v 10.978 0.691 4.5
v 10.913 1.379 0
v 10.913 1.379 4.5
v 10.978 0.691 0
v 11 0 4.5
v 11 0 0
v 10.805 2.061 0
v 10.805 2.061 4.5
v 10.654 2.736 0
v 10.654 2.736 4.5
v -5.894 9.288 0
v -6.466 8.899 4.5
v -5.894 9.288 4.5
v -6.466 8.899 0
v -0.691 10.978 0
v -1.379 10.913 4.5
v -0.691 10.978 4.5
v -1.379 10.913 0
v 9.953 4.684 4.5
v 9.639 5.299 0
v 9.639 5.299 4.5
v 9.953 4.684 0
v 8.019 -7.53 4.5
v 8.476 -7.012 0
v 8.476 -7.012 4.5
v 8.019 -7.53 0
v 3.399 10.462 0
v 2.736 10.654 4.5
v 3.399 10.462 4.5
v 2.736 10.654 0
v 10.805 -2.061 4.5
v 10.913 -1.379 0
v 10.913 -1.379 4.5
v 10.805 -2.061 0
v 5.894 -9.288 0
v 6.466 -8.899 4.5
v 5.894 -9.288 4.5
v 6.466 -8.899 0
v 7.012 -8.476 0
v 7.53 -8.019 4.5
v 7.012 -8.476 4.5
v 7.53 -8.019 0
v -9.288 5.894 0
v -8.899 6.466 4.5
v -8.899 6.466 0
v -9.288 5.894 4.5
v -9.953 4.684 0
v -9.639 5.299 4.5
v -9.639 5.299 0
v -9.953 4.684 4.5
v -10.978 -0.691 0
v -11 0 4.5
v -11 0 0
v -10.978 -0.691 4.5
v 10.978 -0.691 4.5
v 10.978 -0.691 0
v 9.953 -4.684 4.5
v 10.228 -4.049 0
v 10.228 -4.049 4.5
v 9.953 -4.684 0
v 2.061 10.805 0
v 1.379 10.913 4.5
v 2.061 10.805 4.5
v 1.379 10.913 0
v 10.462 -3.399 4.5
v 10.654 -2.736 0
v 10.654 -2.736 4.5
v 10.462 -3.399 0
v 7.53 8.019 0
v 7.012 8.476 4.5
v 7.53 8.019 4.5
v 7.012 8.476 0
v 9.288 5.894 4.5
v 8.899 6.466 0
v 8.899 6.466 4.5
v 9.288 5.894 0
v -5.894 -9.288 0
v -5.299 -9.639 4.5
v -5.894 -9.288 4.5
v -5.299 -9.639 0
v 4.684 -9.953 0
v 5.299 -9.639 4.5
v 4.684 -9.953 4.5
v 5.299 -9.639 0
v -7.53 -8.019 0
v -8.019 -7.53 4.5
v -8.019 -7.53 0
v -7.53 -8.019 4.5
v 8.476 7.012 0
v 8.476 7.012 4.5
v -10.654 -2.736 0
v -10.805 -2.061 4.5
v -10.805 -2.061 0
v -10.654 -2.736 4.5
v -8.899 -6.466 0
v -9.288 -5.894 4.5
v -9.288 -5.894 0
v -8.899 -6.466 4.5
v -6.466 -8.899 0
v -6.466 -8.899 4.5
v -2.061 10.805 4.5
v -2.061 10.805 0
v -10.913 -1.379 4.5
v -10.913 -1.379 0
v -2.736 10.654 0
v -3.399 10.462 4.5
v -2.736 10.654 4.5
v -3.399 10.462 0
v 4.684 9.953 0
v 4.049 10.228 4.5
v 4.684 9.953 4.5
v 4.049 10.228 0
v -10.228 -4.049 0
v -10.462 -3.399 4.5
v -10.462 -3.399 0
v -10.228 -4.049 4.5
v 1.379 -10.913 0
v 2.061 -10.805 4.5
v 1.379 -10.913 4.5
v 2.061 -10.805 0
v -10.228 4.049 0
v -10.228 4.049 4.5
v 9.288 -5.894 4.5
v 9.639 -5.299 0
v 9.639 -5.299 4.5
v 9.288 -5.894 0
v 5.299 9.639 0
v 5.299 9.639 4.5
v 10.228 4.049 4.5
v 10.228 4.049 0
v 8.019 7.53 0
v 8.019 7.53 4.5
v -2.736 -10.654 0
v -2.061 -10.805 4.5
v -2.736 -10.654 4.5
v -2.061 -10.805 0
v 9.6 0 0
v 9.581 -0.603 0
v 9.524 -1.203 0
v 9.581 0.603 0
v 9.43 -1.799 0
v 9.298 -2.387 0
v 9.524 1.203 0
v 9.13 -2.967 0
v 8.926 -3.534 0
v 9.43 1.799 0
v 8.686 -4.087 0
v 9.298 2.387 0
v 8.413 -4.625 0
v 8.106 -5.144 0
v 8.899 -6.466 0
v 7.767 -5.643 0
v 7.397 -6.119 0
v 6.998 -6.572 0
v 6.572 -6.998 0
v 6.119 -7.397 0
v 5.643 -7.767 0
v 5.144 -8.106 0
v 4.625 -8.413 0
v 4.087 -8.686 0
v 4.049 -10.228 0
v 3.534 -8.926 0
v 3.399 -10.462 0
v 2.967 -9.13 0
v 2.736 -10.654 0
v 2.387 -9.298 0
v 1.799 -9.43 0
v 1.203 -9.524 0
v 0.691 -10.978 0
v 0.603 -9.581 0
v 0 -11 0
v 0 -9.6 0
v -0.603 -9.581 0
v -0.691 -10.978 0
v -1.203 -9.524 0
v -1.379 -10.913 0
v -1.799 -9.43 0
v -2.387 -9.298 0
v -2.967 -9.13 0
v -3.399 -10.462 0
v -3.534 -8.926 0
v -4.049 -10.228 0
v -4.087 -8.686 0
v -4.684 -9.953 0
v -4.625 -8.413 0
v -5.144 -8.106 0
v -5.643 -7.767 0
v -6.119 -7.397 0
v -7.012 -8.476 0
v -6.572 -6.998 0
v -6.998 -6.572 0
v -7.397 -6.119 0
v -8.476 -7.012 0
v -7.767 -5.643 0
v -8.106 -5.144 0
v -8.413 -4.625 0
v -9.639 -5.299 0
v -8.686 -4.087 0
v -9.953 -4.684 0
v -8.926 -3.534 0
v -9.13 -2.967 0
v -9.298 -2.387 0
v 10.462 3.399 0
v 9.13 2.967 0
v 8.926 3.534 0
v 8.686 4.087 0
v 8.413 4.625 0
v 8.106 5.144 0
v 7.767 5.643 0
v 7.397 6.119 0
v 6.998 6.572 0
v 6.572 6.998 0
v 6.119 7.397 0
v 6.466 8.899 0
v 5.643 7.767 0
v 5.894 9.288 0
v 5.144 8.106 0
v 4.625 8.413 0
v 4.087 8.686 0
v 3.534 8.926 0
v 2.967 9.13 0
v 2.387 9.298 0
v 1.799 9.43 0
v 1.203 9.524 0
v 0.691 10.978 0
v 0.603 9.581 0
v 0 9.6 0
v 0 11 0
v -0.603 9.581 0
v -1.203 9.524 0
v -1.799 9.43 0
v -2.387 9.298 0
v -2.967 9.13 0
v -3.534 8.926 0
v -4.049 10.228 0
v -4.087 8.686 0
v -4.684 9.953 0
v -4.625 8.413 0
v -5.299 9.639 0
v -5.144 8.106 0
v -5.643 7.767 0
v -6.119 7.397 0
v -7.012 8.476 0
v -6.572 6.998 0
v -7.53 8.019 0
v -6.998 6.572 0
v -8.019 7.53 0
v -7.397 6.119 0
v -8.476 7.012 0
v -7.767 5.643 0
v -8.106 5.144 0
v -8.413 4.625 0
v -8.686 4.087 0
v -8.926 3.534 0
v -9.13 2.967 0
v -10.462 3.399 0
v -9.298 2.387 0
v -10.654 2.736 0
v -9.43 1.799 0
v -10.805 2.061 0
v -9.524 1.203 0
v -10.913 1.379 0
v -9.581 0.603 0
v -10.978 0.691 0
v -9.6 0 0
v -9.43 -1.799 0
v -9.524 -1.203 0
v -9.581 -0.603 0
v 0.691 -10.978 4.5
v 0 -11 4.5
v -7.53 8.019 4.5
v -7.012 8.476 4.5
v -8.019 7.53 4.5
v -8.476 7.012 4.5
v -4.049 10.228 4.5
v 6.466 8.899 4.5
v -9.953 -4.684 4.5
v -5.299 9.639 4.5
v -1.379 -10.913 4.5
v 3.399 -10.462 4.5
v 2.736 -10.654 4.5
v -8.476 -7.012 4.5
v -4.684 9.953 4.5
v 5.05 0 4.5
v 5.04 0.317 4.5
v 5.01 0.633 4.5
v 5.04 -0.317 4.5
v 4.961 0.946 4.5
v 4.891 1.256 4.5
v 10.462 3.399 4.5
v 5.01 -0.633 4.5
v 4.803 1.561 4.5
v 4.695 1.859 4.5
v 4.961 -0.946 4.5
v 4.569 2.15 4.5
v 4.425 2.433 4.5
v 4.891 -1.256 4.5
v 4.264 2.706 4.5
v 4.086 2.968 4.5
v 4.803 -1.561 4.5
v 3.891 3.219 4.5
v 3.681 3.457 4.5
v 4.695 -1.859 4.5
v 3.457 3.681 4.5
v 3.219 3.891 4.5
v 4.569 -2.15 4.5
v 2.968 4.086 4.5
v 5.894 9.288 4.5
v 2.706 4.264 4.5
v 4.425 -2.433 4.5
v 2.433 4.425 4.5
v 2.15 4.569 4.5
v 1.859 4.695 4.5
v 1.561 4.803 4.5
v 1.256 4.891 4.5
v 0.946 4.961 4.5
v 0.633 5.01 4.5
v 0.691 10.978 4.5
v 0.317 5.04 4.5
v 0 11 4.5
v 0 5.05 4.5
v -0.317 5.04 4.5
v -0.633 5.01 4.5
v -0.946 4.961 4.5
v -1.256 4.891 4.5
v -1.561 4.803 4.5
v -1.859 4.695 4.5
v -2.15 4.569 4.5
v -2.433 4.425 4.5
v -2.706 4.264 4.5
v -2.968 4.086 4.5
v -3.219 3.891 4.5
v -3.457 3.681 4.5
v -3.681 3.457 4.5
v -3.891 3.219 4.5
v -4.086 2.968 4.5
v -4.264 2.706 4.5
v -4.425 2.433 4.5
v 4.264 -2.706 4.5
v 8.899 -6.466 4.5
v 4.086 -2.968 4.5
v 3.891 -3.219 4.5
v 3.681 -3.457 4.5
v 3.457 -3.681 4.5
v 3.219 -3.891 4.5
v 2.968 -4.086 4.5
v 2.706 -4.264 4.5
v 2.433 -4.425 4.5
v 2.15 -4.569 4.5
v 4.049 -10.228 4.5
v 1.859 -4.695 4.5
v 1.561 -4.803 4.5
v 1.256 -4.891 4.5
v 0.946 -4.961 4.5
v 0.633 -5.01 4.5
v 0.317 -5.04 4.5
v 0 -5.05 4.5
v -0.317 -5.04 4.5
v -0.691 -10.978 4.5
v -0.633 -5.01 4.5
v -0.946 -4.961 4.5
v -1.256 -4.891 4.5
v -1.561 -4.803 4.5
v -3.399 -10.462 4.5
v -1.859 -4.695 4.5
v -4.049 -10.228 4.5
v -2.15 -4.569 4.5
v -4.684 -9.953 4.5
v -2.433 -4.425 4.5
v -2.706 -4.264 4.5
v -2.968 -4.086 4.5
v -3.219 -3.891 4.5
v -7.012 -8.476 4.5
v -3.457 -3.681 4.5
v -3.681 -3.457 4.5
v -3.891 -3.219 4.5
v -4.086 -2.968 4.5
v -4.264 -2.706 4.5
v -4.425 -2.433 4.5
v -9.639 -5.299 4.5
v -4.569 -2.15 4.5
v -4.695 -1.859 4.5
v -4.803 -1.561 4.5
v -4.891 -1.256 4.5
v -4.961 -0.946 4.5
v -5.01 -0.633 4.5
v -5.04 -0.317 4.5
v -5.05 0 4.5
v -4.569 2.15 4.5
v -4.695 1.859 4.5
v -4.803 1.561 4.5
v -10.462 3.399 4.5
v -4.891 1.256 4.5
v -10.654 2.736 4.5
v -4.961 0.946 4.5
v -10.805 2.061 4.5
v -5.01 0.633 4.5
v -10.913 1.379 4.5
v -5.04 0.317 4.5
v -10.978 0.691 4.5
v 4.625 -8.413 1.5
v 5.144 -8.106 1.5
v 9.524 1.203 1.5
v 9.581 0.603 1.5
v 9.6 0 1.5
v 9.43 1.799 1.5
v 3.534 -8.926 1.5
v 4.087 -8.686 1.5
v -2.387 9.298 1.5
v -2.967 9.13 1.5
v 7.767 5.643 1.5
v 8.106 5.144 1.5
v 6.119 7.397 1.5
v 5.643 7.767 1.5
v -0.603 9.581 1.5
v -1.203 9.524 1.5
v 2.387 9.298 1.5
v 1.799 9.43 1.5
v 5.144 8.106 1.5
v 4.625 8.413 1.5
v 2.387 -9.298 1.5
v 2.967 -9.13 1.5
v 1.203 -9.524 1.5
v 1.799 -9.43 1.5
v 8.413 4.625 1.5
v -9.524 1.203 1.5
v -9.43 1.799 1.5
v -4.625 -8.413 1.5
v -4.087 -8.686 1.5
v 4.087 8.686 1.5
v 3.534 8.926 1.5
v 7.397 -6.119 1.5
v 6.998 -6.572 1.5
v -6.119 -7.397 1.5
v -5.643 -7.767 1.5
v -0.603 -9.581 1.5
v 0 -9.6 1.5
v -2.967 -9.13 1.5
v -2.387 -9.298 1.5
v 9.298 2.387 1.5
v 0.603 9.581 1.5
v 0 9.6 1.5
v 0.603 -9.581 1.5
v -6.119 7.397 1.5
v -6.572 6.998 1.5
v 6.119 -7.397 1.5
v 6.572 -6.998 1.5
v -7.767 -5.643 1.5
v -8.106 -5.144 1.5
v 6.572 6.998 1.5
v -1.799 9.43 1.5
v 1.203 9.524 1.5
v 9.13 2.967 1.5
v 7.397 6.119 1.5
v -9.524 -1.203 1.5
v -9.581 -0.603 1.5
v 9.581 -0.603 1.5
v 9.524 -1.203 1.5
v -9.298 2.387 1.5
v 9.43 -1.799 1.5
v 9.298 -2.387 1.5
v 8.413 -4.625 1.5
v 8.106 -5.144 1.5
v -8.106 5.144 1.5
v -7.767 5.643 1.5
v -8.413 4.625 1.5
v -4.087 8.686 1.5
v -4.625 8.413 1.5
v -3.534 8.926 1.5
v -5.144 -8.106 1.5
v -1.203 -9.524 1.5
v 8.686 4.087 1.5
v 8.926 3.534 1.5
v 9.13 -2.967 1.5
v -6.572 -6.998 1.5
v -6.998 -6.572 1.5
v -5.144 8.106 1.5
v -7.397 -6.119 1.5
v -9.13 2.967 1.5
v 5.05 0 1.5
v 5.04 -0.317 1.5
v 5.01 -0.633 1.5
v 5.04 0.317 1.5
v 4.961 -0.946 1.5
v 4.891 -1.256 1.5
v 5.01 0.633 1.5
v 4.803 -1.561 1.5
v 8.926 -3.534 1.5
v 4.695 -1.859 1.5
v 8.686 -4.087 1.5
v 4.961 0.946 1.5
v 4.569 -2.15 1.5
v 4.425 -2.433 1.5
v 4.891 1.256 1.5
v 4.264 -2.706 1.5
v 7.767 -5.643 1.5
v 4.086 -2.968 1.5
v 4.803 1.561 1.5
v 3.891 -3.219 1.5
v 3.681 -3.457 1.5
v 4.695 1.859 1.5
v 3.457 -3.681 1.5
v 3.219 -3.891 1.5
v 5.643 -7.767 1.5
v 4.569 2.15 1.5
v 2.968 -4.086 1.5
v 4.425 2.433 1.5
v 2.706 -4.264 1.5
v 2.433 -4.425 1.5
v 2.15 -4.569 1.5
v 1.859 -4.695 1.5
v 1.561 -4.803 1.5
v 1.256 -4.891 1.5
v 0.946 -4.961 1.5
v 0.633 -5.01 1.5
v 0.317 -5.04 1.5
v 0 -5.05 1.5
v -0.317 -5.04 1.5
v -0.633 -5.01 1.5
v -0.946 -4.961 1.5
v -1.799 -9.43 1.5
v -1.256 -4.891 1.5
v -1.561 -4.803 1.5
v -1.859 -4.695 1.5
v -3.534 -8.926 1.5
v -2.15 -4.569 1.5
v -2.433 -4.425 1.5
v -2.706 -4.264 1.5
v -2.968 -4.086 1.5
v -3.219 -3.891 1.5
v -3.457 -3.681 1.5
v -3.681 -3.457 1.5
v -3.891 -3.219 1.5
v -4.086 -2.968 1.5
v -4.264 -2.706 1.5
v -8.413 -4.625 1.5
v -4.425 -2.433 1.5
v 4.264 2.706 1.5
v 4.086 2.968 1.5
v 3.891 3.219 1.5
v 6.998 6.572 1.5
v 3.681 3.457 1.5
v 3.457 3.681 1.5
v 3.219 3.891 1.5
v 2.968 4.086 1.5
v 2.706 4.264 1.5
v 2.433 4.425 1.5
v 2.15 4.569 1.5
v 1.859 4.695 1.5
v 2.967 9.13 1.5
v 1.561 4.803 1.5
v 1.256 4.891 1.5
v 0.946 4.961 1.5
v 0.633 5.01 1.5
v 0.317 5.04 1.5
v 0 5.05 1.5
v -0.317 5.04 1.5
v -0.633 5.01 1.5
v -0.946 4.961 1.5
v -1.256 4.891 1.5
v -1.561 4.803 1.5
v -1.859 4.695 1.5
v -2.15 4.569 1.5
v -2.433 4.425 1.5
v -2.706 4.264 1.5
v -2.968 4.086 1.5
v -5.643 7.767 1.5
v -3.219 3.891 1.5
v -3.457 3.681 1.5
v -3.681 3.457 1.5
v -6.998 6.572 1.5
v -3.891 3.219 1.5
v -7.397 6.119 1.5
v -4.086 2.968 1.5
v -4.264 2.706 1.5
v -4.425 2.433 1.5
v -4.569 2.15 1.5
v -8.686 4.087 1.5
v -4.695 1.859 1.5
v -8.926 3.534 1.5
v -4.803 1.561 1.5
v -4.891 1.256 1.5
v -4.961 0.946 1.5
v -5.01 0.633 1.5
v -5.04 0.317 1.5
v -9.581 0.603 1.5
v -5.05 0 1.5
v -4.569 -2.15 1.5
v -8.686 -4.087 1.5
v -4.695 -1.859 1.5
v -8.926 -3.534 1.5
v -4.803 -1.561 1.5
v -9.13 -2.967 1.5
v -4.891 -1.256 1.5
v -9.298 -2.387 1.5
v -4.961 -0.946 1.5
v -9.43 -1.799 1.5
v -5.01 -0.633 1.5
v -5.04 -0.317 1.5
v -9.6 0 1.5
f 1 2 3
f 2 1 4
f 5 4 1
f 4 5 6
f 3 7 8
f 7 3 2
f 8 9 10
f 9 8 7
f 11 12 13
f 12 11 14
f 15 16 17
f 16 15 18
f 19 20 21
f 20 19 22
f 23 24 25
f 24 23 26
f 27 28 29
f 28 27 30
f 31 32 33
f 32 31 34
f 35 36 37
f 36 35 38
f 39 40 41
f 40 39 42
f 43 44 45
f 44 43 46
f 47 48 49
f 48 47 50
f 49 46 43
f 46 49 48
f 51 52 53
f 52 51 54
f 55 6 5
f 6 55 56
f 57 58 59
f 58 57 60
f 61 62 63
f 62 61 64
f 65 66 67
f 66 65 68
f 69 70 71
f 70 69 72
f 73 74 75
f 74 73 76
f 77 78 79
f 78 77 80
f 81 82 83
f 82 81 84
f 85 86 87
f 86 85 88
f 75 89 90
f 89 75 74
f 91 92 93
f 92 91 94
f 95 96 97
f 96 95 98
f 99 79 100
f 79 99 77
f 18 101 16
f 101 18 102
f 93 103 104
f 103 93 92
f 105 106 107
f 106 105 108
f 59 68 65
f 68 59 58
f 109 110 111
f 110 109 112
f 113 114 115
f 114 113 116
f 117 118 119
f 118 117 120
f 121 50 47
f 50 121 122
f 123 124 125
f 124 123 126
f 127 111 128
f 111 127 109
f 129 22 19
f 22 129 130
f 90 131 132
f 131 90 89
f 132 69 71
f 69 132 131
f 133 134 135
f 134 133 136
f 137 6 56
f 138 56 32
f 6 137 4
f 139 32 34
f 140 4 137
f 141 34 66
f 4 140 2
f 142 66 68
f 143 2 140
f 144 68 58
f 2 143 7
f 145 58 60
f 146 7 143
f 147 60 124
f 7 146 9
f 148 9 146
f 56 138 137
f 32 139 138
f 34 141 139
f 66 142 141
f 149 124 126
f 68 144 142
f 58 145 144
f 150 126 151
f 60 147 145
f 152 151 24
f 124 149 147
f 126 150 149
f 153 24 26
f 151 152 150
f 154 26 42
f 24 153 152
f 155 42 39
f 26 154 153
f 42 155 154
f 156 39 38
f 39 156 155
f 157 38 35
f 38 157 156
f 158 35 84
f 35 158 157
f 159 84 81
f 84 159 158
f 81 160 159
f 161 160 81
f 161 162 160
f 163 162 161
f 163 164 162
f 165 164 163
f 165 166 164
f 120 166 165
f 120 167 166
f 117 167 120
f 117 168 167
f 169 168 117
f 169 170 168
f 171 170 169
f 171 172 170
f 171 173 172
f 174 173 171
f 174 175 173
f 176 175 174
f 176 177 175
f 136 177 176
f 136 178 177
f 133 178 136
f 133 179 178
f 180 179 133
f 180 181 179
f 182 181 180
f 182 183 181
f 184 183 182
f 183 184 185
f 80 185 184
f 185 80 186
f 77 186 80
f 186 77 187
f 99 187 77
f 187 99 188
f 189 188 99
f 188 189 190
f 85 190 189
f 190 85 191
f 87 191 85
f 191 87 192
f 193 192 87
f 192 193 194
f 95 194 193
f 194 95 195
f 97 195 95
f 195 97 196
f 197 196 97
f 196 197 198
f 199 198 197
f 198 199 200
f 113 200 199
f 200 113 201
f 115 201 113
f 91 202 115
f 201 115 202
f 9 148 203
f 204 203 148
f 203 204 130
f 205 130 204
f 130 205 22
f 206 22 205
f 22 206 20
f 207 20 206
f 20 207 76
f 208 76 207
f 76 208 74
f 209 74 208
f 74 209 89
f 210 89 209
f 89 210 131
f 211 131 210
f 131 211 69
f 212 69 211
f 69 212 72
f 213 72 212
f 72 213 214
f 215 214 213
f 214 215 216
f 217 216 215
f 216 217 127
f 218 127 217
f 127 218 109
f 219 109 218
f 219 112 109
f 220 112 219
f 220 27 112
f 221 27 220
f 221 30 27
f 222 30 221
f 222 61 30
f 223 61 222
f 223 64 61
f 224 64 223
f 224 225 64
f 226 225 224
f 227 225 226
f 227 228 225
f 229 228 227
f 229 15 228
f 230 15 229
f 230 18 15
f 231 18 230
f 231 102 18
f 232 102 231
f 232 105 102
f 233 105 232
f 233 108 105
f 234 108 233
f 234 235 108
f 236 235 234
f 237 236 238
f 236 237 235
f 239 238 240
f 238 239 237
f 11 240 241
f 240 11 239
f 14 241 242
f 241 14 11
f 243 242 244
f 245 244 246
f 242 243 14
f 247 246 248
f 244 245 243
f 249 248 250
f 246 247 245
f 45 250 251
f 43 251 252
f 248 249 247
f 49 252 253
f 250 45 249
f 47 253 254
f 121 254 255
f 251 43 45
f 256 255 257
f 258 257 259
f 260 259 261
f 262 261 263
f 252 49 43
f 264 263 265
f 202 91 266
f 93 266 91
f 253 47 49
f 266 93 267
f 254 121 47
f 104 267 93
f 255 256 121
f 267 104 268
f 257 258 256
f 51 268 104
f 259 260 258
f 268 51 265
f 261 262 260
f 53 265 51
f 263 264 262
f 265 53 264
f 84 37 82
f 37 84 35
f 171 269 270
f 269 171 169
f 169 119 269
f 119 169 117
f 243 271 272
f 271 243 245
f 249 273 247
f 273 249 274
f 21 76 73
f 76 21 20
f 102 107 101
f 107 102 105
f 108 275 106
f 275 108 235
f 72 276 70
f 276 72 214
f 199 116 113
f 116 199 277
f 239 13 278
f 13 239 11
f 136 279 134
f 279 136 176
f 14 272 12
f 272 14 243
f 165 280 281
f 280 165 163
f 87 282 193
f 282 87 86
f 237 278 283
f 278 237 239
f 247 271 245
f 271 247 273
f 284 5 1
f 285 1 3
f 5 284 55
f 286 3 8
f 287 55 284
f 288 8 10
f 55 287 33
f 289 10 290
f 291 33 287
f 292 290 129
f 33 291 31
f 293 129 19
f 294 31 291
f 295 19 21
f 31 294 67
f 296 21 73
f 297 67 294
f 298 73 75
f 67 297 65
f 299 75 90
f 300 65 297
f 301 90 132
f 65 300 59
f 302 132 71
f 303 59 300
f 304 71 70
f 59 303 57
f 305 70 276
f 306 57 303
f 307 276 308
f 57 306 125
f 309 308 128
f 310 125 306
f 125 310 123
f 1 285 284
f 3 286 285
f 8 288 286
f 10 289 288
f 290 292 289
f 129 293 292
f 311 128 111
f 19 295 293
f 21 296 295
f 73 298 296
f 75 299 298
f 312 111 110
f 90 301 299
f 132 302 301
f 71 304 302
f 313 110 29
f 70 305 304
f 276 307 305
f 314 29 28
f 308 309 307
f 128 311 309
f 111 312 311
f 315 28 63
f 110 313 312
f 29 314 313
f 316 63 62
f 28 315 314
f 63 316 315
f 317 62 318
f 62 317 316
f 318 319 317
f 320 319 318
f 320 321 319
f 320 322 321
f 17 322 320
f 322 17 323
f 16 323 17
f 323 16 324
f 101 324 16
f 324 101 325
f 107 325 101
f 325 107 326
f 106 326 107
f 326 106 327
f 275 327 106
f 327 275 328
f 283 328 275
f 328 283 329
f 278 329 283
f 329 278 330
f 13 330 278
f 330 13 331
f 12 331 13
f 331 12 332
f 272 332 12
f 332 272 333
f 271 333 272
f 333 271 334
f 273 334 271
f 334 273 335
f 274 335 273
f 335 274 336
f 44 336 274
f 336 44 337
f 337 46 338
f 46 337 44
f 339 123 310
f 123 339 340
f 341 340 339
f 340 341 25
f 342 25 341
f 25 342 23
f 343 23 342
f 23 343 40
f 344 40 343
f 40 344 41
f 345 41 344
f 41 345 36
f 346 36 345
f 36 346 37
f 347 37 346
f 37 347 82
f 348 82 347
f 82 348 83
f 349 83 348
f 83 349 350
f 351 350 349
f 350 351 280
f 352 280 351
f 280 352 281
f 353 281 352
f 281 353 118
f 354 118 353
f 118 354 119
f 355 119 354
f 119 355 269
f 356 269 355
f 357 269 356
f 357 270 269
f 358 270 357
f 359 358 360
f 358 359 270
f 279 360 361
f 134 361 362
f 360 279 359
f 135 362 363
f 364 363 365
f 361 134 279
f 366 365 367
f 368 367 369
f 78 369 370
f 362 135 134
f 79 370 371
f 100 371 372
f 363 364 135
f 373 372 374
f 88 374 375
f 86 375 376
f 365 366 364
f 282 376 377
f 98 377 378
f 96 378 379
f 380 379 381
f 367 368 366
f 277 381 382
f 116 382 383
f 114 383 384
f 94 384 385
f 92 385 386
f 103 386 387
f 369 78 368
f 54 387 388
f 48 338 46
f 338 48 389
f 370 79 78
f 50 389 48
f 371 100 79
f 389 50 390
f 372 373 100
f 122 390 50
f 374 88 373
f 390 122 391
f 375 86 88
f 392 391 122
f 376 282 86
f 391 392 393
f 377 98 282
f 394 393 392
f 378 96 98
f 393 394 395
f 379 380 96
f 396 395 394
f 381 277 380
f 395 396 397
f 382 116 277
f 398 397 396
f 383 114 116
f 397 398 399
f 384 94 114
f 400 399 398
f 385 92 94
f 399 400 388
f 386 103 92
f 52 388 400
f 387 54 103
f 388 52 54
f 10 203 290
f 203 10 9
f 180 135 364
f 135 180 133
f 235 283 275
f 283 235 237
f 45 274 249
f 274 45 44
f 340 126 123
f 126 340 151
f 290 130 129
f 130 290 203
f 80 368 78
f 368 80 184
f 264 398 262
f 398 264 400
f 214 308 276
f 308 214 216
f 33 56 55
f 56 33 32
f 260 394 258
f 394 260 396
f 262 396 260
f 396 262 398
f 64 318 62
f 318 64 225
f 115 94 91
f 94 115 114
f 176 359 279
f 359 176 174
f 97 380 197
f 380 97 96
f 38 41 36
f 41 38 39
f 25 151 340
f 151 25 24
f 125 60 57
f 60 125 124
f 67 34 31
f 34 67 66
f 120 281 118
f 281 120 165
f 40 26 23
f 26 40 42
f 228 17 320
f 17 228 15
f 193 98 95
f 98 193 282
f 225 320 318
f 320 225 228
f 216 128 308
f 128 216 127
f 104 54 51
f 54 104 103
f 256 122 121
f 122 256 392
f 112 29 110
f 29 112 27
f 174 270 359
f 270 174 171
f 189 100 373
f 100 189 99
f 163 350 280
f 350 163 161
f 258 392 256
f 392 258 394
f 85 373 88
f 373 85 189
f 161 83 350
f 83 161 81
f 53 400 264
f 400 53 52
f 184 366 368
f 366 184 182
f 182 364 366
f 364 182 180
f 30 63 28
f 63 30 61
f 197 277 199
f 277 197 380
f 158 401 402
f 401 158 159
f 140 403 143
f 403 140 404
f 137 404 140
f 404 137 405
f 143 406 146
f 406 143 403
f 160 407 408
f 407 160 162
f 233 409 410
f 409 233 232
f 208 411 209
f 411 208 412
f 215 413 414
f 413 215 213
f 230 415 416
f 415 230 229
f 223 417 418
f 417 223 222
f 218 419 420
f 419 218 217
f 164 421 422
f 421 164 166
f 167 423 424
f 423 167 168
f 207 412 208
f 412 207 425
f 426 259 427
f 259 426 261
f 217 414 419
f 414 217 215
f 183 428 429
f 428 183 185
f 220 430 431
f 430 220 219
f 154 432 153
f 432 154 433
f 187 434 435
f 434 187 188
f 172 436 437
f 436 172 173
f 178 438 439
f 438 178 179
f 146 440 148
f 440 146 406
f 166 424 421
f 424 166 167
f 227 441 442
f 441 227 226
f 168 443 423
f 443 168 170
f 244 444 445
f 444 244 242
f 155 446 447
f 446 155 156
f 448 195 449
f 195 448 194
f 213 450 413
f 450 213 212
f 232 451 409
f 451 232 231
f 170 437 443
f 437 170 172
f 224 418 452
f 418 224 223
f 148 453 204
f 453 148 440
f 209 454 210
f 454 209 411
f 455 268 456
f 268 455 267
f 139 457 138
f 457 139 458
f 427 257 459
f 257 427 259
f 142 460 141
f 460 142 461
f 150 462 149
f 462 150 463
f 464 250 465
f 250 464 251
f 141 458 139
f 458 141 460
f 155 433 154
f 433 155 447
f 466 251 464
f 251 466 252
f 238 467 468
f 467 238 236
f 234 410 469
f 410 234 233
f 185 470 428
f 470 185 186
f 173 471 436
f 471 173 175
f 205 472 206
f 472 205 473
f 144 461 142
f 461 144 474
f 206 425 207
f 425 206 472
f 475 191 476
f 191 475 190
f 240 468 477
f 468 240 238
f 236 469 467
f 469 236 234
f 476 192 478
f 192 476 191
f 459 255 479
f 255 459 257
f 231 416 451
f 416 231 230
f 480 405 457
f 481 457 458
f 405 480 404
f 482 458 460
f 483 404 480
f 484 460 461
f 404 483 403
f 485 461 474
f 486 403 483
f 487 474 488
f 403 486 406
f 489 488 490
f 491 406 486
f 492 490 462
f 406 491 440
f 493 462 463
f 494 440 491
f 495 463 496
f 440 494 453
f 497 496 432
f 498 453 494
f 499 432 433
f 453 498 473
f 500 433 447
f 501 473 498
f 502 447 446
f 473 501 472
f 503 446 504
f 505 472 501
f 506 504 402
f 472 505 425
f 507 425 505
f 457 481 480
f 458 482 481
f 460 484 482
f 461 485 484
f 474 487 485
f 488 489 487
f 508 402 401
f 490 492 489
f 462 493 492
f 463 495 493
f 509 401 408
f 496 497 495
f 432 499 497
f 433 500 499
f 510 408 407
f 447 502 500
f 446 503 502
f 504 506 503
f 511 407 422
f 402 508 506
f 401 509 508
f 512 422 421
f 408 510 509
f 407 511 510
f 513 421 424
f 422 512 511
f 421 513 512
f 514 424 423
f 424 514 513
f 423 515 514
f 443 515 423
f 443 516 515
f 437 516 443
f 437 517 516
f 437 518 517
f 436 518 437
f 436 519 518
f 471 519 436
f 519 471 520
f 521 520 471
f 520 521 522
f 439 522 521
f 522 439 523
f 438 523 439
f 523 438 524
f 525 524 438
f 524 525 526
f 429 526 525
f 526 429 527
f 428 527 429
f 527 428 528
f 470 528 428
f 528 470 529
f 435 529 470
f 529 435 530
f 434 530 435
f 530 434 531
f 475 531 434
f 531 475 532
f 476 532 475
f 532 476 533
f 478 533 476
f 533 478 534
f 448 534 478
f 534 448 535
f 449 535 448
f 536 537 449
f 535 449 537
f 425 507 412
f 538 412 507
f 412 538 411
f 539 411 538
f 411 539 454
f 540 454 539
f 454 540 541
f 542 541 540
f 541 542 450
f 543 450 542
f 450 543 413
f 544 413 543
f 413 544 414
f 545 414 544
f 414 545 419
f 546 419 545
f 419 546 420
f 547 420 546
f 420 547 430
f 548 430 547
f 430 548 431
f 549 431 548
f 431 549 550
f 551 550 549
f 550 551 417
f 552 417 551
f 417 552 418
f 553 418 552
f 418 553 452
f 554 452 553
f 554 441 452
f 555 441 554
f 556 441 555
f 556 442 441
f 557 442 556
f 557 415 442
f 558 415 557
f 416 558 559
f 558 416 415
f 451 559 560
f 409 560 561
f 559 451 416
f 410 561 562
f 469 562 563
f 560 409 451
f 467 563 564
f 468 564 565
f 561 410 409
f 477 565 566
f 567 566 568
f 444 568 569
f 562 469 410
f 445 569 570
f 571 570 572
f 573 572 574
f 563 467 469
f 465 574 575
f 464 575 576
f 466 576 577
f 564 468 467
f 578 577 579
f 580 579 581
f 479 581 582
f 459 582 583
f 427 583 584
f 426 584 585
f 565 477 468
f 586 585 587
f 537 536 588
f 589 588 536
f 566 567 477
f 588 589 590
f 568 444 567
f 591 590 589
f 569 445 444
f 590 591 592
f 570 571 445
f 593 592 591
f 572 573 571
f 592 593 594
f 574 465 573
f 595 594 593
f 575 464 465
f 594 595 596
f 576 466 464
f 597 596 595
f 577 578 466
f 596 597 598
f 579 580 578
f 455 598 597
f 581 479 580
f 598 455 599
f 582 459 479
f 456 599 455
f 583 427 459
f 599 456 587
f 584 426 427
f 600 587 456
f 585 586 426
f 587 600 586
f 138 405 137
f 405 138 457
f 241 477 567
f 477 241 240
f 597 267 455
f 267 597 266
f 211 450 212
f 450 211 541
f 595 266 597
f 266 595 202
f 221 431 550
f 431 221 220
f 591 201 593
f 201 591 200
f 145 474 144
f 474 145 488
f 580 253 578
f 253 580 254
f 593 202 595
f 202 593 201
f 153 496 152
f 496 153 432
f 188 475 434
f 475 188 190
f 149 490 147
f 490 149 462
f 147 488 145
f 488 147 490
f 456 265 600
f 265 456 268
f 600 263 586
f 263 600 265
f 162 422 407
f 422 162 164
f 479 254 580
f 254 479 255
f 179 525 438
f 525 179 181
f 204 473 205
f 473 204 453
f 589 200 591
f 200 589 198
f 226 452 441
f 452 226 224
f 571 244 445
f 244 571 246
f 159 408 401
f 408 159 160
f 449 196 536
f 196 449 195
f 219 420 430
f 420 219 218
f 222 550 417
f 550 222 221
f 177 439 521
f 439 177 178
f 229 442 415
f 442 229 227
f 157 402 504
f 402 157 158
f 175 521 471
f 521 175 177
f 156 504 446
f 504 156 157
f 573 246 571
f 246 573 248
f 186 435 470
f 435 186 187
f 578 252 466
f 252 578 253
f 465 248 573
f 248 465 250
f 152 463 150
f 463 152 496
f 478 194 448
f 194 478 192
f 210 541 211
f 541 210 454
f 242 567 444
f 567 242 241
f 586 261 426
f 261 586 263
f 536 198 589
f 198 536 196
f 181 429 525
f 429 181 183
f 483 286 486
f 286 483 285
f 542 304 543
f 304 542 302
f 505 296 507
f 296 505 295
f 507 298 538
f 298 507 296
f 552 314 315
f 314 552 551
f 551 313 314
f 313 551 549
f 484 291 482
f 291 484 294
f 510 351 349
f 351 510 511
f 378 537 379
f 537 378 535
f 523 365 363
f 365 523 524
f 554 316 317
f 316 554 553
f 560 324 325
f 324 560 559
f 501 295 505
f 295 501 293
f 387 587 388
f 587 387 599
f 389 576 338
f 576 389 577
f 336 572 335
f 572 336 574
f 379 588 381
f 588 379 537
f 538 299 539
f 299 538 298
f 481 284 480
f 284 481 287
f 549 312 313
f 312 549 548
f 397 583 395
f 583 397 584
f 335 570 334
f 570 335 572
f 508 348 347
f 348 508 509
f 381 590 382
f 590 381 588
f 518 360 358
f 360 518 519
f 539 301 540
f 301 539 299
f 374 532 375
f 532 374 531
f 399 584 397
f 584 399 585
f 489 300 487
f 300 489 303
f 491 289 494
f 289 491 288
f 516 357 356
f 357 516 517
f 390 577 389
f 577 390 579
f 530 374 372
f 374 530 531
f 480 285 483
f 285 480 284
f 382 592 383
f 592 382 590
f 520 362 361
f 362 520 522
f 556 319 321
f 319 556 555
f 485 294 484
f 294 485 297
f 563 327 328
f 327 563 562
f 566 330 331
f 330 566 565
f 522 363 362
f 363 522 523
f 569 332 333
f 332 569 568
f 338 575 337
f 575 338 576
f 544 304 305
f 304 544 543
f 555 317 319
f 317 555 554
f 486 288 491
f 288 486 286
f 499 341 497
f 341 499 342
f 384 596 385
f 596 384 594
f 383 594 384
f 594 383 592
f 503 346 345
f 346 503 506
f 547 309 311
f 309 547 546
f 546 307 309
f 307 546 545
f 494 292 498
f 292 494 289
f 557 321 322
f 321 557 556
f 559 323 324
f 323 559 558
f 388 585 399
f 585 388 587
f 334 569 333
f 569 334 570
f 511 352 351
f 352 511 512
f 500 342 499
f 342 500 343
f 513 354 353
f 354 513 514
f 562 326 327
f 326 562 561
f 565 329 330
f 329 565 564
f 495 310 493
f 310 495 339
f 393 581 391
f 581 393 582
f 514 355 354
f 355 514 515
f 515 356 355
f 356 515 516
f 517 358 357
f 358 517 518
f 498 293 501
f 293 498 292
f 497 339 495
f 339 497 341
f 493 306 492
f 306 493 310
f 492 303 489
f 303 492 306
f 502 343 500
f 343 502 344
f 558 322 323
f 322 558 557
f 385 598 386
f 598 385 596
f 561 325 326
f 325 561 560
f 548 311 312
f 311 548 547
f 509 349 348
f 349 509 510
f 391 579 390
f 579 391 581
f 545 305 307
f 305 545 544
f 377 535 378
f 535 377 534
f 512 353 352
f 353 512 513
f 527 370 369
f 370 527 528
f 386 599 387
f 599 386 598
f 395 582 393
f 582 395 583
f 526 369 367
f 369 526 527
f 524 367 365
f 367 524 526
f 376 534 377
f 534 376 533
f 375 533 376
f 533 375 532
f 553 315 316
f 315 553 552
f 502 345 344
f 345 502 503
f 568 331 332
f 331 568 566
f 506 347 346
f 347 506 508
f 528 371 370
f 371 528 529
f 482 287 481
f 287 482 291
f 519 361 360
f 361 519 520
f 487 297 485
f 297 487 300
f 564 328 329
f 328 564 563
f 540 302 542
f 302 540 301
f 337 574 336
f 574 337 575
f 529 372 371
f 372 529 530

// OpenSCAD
$fn=100;

difference()
{
  cylinder(d=22, h=4.5);
  translate([0,0,-0.0001])cylinder(d=19.2, h=1.5);
  translate([0,0,-5]) cylinder(h=10, d=10.1);
}
